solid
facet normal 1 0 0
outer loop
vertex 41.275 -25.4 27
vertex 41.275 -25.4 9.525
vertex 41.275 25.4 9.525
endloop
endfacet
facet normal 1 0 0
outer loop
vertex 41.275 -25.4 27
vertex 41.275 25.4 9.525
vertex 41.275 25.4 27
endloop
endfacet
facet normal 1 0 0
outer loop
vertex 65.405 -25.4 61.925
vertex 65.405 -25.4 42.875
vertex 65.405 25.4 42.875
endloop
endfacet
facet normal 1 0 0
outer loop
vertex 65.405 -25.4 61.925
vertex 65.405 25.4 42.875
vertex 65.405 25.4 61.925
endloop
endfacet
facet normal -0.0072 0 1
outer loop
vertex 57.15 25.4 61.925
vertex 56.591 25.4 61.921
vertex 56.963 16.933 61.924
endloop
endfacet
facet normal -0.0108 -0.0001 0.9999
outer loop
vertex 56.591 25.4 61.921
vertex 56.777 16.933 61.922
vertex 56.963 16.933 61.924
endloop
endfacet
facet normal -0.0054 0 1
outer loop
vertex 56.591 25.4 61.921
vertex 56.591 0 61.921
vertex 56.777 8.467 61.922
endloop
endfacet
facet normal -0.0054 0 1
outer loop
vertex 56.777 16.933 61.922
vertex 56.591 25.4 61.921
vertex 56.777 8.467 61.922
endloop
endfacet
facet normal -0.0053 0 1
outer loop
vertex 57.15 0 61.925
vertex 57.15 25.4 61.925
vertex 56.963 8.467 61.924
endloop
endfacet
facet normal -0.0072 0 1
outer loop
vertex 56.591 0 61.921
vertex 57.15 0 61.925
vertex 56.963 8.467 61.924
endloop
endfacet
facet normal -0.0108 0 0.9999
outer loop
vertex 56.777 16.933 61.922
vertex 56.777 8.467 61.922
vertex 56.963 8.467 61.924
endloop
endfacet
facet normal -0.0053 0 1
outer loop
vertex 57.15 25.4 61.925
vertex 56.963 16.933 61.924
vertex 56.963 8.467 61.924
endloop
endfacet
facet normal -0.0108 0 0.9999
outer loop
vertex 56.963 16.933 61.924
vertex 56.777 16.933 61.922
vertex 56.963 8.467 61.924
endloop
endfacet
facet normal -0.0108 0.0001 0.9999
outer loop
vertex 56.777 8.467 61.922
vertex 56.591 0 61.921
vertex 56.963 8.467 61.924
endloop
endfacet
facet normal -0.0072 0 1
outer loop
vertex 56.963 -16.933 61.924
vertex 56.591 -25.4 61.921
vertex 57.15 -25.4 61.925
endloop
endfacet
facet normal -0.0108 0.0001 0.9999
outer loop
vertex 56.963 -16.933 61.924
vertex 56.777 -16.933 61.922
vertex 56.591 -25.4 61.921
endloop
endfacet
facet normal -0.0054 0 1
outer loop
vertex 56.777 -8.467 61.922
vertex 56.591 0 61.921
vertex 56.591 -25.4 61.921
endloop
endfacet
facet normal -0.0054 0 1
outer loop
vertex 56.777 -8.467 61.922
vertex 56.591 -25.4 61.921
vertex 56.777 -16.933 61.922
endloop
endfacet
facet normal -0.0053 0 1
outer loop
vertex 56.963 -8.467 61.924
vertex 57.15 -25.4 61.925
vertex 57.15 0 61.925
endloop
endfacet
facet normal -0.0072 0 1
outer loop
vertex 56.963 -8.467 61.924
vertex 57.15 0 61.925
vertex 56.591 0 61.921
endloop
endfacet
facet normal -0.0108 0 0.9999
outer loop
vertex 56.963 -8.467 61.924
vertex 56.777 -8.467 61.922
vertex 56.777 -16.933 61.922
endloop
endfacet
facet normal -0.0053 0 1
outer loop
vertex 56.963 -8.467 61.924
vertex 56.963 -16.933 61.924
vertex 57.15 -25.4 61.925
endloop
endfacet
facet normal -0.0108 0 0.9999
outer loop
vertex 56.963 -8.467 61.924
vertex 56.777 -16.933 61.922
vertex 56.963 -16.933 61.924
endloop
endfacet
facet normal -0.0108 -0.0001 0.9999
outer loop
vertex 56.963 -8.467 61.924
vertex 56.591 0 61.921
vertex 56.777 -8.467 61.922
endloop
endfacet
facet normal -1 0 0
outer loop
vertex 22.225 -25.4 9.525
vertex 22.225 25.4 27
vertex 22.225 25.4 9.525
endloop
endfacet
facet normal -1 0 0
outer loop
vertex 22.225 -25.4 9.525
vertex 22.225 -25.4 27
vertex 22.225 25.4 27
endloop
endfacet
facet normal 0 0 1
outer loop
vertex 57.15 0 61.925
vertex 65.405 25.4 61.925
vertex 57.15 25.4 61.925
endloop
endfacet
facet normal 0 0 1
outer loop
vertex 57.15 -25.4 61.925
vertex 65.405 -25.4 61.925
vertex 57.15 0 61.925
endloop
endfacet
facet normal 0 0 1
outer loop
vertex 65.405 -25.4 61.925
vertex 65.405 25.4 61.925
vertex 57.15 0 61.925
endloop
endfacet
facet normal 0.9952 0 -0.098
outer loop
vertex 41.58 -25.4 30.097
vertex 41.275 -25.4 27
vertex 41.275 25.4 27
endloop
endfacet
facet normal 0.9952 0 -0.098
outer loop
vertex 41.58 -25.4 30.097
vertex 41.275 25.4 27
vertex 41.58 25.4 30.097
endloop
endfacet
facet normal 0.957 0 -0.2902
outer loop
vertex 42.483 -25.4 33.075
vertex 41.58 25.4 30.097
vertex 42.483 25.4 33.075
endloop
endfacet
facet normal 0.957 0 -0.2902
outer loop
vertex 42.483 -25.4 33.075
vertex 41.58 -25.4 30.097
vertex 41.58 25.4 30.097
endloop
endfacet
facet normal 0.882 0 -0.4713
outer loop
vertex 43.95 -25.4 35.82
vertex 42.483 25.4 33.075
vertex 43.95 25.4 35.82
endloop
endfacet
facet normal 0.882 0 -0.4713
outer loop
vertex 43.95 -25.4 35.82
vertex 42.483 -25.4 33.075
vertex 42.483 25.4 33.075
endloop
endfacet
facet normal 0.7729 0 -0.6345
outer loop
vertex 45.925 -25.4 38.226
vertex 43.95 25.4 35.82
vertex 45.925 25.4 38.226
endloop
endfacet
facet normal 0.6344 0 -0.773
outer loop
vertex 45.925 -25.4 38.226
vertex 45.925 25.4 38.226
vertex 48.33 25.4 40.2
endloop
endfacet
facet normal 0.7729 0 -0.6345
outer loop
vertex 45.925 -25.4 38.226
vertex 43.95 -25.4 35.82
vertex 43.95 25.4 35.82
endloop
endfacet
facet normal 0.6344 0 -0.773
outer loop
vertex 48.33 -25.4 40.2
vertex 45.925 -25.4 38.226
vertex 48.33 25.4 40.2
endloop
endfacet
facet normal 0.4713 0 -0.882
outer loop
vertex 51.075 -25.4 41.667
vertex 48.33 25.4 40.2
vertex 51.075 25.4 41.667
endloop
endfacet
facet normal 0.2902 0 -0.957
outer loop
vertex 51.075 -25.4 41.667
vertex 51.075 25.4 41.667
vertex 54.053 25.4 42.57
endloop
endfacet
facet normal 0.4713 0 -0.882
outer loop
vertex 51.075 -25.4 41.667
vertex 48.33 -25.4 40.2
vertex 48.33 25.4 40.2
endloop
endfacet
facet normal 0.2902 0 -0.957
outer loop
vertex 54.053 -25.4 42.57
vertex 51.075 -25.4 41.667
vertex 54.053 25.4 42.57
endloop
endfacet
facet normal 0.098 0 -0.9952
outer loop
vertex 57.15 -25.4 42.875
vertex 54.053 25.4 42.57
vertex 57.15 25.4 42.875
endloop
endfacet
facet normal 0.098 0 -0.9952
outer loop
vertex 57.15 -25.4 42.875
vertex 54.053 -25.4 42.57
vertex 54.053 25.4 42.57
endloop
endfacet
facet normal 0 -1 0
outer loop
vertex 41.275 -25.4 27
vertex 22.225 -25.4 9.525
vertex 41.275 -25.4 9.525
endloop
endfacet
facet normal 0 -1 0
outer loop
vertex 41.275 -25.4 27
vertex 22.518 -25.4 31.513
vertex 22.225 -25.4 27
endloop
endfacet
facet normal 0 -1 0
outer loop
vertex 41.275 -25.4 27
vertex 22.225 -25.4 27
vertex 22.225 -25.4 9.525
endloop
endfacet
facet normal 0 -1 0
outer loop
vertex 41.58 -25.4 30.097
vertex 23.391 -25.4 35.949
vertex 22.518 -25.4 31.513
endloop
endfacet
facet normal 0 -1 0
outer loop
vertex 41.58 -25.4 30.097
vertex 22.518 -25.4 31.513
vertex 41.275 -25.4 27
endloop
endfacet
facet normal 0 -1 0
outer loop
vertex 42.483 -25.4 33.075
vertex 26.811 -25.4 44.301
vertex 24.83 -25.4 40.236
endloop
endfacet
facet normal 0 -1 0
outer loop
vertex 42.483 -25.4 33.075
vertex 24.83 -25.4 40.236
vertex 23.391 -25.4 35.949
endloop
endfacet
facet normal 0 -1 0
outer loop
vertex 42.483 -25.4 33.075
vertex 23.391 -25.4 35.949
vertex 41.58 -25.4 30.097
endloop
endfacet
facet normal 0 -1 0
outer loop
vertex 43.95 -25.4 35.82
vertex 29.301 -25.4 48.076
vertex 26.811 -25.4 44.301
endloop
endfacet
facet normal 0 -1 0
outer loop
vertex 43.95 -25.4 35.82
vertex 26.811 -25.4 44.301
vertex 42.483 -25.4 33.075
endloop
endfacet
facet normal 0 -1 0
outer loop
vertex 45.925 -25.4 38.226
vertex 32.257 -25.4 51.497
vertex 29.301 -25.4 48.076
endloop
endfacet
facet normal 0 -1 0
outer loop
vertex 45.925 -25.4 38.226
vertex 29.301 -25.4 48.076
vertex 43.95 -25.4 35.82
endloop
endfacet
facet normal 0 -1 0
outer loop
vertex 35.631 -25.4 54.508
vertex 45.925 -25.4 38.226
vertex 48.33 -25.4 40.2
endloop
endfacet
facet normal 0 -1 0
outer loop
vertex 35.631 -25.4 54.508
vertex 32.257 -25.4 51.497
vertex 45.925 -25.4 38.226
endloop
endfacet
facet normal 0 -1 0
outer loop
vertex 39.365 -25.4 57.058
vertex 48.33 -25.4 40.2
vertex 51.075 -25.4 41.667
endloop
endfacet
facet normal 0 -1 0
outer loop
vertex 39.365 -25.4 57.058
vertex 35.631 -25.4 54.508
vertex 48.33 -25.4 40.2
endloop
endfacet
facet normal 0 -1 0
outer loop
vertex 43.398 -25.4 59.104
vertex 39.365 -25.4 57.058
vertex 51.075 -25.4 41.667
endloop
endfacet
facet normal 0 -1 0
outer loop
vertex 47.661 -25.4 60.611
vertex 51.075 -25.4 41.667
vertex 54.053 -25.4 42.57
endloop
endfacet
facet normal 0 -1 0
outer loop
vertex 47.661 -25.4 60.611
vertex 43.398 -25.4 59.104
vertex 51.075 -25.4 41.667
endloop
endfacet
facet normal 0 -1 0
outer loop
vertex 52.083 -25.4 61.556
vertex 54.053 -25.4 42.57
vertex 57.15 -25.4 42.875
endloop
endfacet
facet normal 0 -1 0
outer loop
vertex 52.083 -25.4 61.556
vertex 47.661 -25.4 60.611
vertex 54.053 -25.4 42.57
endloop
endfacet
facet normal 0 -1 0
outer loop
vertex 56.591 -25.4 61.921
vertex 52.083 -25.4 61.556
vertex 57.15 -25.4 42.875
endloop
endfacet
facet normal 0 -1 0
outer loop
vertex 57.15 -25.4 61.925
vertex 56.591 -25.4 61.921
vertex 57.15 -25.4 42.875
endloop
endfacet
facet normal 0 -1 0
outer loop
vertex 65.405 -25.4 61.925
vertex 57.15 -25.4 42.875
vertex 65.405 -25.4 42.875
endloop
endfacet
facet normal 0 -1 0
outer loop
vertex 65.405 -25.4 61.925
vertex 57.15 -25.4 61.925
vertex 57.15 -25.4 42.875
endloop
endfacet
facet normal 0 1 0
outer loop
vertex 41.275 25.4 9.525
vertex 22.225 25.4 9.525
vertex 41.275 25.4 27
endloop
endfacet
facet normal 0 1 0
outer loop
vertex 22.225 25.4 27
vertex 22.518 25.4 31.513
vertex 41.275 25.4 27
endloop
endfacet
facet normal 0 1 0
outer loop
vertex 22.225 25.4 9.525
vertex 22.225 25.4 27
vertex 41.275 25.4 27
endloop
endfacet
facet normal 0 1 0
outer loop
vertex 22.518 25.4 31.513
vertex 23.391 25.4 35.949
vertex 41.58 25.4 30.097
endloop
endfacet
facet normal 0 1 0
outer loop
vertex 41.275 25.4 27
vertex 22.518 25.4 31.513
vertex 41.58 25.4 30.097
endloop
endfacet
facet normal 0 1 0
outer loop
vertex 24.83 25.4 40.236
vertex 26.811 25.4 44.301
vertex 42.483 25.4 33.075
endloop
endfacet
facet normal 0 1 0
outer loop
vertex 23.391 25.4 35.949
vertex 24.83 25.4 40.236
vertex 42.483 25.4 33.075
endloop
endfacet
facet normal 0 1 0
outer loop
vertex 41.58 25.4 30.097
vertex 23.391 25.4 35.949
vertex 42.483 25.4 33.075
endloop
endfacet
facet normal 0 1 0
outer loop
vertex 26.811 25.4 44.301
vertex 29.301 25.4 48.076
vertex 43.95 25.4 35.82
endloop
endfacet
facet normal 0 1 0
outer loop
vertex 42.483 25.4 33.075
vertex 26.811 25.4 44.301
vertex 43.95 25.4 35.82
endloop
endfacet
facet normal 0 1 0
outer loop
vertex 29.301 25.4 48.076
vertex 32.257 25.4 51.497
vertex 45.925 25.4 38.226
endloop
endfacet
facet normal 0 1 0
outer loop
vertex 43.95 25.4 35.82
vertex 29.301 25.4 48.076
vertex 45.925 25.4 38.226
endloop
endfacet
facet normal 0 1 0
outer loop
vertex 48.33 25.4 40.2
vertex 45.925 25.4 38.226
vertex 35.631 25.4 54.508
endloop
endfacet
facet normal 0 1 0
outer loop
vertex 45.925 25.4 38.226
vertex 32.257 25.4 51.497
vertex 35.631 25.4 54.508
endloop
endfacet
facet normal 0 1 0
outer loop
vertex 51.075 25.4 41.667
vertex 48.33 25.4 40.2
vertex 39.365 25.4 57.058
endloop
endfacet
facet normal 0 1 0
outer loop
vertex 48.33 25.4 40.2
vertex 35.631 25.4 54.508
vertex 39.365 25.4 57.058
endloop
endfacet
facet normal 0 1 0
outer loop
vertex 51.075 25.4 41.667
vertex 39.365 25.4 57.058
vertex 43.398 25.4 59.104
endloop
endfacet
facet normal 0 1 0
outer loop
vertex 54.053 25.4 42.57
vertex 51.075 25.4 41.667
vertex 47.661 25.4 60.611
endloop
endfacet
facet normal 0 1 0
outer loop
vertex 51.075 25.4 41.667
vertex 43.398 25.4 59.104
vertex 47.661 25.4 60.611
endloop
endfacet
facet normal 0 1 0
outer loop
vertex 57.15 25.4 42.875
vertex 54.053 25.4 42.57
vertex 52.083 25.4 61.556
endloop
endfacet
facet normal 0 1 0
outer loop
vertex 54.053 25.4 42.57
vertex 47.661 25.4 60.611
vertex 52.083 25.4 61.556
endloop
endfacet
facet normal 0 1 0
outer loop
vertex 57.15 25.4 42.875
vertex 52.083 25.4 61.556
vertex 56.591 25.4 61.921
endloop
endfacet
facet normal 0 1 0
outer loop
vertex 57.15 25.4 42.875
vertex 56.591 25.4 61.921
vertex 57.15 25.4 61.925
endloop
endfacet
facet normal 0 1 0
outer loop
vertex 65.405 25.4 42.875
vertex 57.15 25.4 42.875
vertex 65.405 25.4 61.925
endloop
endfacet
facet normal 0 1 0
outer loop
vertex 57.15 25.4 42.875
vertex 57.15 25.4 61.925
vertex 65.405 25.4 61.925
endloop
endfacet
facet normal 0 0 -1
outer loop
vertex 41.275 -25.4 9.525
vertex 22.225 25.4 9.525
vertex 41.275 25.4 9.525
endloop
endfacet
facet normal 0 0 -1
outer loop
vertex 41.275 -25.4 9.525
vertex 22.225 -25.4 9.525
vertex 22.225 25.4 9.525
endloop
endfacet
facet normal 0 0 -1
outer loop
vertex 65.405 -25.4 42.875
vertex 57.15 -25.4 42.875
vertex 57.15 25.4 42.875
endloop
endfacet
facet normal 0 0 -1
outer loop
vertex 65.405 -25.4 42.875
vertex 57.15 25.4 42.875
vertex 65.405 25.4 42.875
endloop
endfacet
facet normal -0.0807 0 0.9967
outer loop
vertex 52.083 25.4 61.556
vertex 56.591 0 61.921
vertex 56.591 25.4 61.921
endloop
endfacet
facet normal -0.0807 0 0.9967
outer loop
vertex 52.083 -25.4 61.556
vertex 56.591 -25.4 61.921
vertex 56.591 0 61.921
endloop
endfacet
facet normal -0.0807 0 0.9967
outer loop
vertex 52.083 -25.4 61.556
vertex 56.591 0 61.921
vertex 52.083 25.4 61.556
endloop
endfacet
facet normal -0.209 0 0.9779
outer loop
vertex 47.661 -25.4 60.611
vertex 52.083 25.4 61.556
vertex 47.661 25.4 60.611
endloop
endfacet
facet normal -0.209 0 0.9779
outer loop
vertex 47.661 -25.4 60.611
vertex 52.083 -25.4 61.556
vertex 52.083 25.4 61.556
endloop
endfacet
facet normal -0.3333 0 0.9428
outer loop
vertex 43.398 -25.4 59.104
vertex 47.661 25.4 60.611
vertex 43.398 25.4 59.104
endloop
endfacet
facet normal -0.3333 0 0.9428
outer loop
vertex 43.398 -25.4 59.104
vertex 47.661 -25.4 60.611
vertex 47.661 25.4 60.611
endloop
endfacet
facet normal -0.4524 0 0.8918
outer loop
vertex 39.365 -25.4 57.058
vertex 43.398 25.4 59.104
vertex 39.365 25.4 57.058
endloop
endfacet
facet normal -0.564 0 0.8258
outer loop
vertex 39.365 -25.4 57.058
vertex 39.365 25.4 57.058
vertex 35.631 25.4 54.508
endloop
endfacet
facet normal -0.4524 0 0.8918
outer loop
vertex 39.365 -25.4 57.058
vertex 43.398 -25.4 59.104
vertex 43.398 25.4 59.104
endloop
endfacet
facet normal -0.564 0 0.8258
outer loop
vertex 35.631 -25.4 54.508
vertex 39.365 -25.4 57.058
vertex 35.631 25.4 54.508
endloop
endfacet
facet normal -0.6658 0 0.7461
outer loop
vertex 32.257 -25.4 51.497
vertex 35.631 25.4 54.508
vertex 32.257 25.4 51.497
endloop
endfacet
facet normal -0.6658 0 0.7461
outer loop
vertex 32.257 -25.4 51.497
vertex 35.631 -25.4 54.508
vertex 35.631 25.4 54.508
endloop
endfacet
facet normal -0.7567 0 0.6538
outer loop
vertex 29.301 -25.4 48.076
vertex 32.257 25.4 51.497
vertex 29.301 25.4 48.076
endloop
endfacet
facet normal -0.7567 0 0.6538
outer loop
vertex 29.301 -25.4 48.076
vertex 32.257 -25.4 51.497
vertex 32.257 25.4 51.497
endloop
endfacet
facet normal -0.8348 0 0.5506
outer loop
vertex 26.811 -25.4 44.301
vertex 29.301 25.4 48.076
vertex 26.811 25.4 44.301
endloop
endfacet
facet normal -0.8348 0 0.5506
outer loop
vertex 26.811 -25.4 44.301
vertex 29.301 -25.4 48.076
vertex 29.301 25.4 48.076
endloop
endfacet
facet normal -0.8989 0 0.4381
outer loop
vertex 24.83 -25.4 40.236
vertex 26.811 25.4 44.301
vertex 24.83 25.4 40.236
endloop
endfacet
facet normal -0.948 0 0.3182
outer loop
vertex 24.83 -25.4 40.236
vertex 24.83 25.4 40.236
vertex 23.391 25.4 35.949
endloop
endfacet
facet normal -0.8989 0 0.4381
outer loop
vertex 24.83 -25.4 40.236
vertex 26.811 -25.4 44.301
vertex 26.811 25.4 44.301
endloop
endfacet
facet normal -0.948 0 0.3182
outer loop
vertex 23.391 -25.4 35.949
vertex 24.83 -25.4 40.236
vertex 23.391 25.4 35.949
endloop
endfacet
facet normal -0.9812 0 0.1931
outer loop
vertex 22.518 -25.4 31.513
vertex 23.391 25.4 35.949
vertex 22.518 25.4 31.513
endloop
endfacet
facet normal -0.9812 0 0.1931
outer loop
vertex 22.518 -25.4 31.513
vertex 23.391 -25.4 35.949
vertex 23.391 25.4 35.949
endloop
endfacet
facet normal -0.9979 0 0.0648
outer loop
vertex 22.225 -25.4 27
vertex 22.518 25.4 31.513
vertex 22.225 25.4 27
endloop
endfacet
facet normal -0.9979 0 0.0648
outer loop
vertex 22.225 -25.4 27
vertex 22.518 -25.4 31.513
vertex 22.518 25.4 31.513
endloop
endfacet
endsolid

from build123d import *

# Parameters (mm, degrees)
F1_DEPTH = 25.4


with BuildPart() as f1:
    # F0 (on Front) → F1 (new body, symmetric)
    with BuildSketch(Plane.XZ):
        with BuildLine():
            Line((22.225, 9.525), (41.275, 9.525))
            Line((41.275, 9.525), (41.275, 27.0002))
            ThreePointArc((41.275, 27.0002), (45.92468, 38.22552), (57.15, 42.8752))
            Line((57.15, 42.8752), (65.405, 42.8752))
            Line((65.405, 42.8752), (65.405, 61.9252))
            Line((65.405, 61.9252), (57.15, 61.9252))
            add(Edge.make_bspline(
                [(56.590509, 61.920718), (56.776833, 61.922454), (56.963331, 61.923948), (57.15, 61.9252)],
                knots=[111.140328, 111.140328, 111.140328, 111.140328, 111.504536, 111.504536, 111.504536, 111.504536], degree=3))
            ThreePointArc((56.590509, 61.920718), (32.257272, 51.497296), (22.225, 27.0002))
            Line((22.225, 27.0002), (22.225, 9.525))
        make_face()
    extrude(amount=F1_DEPTH, both=True)


solid = f1.part
